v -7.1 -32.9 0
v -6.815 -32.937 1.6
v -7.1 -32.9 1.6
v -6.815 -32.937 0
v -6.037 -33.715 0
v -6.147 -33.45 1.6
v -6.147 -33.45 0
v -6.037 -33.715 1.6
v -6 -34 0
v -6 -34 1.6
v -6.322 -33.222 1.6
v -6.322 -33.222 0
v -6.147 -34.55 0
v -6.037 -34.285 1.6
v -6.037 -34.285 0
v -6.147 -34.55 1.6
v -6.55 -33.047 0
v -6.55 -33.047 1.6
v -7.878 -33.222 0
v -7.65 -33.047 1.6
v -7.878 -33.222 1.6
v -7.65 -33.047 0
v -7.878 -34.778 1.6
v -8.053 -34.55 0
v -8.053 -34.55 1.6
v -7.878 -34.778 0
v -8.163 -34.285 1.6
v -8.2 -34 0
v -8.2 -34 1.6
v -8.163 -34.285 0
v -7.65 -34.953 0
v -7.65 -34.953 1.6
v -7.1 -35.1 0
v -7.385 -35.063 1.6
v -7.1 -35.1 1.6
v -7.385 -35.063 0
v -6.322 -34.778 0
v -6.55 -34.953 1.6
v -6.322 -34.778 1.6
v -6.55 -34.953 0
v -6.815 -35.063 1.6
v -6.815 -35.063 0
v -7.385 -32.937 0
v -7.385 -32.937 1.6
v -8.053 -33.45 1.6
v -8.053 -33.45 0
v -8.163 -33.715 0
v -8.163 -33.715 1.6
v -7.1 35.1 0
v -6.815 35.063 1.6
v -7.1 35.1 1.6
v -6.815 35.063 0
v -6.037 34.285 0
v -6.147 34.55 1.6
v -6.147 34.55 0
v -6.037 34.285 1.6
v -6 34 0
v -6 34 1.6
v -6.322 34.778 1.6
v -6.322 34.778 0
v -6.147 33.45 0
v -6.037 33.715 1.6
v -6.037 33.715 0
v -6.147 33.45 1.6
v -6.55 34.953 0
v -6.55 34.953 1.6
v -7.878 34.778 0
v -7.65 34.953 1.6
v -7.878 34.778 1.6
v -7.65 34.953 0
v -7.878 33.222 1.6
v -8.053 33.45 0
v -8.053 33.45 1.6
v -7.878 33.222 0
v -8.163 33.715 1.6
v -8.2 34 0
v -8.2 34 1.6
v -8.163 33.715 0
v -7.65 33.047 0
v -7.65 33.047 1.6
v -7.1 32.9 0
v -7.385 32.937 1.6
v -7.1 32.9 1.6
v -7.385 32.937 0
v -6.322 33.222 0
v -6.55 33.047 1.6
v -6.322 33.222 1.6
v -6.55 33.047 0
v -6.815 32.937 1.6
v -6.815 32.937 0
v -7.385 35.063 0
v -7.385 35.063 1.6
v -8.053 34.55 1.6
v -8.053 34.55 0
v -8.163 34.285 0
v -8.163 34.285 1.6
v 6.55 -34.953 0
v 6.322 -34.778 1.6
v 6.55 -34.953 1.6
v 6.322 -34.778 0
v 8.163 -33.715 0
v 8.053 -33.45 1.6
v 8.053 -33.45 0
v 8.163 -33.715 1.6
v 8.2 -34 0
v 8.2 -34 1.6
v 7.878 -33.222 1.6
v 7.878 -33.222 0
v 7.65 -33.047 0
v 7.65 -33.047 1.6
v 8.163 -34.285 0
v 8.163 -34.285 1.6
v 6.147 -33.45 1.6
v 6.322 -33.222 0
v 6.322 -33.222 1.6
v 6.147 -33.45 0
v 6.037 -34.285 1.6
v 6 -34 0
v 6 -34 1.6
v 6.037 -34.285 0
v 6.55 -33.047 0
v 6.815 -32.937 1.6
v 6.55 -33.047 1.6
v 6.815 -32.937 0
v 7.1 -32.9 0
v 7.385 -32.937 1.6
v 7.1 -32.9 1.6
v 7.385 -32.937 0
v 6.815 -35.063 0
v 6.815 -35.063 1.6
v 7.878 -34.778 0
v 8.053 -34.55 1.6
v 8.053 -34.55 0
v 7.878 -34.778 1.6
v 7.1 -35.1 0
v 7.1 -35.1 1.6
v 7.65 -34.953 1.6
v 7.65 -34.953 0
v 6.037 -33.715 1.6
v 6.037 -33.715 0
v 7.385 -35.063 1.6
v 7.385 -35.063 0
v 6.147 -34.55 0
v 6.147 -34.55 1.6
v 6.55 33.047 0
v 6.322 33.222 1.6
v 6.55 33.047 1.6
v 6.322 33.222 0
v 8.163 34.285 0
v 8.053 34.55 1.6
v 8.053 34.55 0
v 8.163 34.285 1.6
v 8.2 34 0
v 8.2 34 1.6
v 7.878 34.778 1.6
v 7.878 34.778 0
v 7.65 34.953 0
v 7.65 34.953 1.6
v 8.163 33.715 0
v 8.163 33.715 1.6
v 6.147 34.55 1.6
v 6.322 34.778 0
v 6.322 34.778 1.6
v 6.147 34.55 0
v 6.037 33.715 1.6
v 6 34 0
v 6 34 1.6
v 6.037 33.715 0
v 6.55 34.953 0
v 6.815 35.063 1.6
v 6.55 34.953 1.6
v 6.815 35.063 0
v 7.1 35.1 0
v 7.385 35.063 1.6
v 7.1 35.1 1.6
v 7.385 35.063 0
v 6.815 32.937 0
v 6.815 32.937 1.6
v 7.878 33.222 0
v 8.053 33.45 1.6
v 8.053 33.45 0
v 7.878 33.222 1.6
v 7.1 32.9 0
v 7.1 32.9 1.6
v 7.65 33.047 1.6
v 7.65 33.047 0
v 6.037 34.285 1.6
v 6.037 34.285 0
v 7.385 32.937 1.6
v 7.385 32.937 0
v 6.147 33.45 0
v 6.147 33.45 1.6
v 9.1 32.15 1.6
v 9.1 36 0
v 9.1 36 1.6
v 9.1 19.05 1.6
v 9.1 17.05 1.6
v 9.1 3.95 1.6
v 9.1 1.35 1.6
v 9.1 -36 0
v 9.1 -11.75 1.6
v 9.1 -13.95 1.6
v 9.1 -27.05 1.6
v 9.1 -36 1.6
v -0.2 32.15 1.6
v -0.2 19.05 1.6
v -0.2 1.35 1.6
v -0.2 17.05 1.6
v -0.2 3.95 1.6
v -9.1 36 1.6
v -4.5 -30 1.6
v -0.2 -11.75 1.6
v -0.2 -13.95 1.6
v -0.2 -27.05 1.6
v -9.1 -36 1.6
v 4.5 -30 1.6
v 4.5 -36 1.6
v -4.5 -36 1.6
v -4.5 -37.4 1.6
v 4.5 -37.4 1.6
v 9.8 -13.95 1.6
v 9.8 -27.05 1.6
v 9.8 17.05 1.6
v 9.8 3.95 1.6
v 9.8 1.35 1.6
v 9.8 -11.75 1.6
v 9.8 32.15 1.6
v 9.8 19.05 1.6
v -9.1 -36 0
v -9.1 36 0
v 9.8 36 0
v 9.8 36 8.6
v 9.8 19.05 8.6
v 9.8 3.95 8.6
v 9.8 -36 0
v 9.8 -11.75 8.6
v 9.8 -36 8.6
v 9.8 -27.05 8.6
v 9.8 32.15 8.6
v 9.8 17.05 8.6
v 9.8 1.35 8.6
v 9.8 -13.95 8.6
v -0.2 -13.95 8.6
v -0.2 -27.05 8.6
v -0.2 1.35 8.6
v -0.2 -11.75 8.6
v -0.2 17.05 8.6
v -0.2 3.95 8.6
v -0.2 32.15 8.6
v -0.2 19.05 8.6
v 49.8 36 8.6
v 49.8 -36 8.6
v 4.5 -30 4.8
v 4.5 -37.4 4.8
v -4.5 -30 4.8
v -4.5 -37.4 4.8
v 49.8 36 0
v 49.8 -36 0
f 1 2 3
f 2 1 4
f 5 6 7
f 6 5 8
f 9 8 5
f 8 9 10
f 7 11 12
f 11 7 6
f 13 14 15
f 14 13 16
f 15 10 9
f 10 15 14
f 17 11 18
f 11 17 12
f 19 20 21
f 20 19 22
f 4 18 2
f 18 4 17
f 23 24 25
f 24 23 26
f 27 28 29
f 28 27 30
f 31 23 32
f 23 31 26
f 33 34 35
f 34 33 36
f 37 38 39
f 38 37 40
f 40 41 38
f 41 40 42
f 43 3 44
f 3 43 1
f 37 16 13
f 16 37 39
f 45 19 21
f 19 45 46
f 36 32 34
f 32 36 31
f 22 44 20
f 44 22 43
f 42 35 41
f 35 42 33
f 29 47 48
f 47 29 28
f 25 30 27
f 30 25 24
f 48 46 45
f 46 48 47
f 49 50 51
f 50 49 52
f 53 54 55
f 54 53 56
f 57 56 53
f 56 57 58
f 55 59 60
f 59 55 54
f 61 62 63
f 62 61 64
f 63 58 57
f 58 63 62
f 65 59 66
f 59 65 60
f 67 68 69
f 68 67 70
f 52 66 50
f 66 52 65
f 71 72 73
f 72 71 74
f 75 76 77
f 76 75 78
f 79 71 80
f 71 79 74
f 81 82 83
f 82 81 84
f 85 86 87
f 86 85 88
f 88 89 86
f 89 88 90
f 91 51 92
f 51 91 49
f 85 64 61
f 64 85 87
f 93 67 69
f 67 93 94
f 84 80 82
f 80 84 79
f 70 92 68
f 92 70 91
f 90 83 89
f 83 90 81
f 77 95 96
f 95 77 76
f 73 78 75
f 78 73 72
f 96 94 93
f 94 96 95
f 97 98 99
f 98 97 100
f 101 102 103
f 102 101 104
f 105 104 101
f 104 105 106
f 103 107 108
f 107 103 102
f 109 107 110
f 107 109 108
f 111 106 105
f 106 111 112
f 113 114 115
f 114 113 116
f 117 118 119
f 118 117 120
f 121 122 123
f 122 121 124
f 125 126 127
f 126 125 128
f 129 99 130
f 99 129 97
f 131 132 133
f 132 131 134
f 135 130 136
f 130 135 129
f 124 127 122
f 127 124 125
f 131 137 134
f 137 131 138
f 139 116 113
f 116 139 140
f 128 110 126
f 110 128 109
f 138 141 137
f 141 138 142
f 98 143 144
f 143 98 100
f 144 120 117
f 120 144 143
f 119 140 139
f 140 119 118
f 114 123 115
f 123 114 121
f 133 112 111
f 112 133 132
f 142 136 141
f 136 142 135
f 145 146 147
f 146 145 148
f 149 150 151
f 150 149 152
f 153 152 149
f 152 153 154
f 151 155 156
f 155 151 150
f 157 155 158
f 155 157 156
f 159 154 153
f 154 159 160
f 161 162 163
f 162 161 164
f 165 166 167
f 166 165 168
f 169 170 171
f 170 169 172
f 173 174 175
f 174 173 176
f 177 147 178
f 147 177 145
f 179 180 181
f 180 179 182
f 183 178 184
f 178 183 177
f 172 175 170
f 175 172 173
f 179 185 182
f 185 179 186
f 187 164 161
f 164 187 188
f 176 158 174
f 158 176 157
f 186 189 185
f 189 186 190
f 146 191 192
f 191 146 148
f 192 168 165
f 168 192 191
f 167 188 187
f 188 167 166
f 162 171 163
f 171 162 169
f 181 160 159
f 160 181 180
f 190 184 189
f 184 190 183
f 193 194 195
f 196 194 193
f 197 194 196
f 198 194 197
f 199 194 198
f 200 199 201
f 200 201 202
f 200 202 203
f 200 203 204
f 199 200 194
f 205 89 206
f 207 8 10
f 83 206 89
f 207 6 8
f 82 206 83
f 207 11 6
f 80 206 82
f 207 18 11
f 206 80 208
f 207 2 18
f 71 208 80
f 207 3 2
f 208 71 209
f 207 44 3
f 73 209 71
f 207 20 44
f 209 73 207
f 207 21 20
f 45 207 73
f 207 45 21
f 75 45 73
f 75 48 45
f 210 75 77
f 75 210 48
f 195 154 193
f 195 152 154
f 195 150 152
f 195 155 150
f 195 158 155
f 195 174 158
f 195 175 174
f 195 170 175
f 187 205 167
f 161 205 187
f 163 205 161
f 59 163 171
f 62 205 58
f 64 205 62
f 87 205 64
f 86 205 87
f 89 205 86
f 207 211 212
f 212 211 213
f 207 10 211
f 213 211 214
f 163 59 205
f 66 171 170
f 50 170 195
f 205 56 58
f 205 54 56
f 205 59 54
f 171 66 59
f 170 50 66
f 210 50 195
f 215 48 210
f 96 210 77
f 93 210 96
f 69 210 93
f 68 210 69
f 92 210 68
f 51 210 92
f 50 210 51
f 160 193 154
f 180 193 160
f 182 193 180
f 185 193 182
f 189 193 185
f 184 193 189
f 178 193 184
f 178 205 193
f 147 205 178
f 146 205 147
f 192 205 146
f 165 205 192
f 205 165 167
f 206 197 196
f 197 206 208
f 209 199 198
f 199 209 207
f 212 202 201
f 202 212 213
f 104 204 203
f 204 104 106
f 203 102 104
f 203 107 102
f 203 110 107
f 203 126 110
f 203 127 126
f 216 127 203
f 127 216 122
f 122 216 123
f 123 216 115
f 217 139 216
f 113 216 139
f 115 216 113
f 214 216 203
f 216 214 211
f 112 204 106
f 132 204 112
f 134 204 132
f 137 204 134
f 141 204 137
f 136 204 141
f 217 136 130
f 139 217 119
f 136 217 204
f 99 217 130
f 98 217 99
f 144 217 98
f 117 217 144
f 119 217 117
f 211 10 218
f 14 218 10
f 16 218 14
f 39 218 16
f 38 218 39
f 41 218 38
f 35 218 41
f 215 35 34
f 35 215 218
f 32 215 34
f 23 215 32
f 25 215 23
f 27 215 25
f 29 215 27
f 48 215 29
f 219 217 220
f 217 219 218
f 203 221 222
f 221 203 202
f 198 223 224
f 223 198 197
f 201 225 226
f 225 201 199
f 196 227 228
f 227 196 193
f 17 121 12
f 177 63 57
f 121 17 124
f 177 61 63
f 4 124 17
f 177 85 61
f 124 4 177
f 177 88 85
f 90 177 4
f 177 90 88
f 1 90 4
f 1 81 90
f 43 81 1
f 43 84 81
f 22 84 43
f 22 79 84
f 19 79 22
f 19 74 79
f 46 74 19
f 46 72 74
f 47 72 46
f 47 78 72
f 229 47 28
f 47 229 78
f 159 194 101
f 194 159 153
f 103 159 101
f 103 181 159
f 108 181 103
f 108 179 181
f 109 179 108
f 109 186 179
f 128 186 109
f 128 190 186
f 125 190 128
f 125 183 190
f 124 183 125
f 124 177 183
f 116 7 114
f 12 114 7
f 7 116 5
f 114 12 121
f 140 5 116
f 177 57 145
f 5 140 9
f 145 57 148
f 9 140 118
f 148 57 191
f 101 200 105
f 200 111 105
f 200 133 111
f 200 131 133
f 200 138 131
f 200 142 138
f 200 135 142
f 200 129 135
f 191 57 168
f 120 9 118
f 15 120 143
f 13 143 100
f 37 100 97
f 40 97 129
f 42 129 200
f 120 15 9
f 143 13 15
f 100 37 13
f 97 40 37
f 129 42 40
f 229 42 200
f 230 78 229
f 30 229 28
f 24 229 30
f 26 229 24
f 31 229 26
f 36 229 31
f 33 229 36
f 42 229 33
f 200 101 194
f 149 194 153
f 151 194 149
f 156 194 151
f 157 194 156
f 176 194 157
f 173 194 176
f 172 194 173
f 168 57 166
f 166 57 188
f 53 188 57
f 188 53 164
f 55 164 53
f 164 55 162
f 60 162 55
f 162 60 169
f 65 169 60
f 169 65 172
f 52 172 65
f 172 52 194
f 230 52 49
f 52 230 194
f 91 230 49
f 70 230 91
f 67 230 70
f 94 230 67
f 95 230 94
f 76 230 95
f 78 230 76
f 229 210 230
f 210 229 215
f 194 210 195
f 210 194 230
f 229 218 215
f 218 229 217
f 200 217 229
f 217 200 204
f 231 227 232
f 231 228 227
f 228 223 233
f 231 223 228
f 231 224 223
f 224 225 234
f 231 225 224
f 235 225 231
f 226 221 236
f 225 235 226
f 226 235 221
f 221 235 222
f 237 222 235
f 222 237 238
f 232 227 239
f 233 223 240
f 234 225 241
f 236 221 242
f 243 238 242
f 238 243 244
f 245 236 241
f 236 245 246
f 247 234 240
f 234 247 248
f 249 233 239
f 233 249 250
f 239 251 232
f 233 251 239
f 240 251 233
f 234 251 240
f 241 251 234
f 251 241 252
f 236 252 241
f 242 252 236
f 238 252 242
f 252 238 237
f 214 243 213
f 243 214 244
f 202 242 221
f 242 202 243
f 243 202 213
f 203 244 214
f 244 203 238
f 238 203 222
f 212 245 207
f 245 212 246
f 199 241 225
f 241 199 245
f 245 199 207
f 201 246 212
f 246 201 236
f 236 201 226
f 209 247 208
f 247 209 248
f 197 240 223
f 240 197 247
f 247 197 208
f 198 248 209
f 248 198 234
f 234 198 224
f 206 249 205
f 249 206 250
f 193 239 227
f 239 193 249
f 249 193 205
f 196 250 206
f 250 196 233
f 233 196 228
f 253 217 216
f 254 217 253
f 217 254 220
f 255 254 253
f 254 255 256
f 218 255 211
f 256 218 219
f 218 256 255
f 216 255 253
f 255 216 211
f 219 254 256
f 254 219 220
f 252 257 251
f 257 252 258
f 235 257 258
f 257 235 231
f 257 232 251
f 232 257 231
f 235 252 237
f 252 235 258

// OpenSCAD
//
// ============================================================================
// SteamMachine UM790
// Project Phoenix
//
// Archivo  : hub_usb.scad
// Versión  : 2.0
// Fecha    : 2026-10-05
//
// Volumen mecánico de referencia del Hub USB para el ensamblaje
// virtual v1.
//
// v2.0 (2026-10-05): SUSTITUYE al CJMCU-204 (44,1 x 44,1 x 12 mm).
// Hub nuevo de placa alargada (72 x 18,2 mm): 4 bocas USB-A
// horizontales en un lado largo (+X local) y entrada USB-C en un
// extremo (-Y local). Medidas tomadas de fotos — ver usb_hub_* en
// 00_parametros.scad.
//
// NO ES UNA PIEZA IMPRIMIBLE.
//
// Sistema de coordenadas LOCAL de este módulo:
//   Origen (0,0,0) = centro de la placa en X/Y, cara inferior
//                     (la que mira a la pared).
//   +Z = hacia los componentes.
//   +X = lado de las bocas USB-A (queda hacia ARRIBA en el chasis).
//   -Y = extremo del USB-C (puede montarse girada 180°: los
//        taladros son simétricos).
//
// ============================================================================

include <../../../00_parametros.scad>;

$fn = 24;

part_version = "2.0";


//=============================================================================
// COLORES
//=============================================================================

hubBodyColor  = [0.20,0.20,0.20,1.0];
hubPortColor  = [0.80,0.80,0.80,1.0];
hubCableColor = [1.00,0.65,0.00,0.15];


//=============================================================================
// PLACA DEL HUB
//=============================================================================

module hubUsbBody()
{

    color(hubBodyColor)

    difference()
    {

        translate([
            -usb_hub_width/2,
            -usb_hub_depth/2,
            0
        ])

            cube([
                usb_hub_width,
                usb_hub_depth,
                usb_hub_pcb_thickness
            ]);

        hubUsbMountHoles();

    }

}


//=============================================================================
// TALADROS DE FIJACIÓN (4x M2, simétricos)
//=============================================================================

module hubUsbMountHoles()
{

    for(ix=[-1,1])
    for(iy=[-1,1])

        translate([ix*usb_hub_hole_spacing_x/2, iy*usb_hub_hole_spacing_y/2, -0.5])

            cylinder(
                d = usb_hub_board_hole,
                h = usb_hub_pcb_thickness+1
            );

}


//=============================================================================
// CONECTORES (4x USB-A en el lado +X, USB-C en el extremo -Y)
//
// Posiciones a lo largo (Y) medidas en las fotos y reescaladas
// (x1,051) con la medida real entre taladros (68 mm): centros de las
// bocas a -20,5 / -5,2 / +10,5 / +25,6 mm del centro de la placa
// (paso ~15,4 mm). Carcasa USB-A ~13,1 x 10 x 7 mm, asomando 0,7 mm
// por el borde +X. USB-C ~9 x 7,4 x 3,2 mm, asomando 1,4 mm por -Y.
//=============================================================================

hub_port_y        = [-20.5, -5.2, 10.5, 25.6];
hub_port_width    = 13.1;
hub_port_length   = 10.0;
hub_port_overhang = 0.7;
hub_port_height   = usb_hub_height - usb_hub_pcb_thickness;

module hubUsbPorts()
{

    color(hubPortColor)
    {

        for(y = hub_port_y)

            translate([
                usb_hub_width/2 + hub_port_overhang - hub_port_length,
                y - hub_port_width/2,
                usb_hub_pcb_thickness
            ])

                cube([hub_port_length, hub_port_width, hub_port_height]);

        translate([-4.5, -usb_hub_depth/2 - 1.4, usb_hub_pcb_thickness])
            cube([9.0, 7.4, 3.2]);

    }

}


//=============================================================================
// CUERPO MECÁNICO (para comprobación de colisiones "duras")
//=============================================================================

module hubUsbBodyFull()
{

    union()
    {
        hubUsbBody();
        hubUsbPorts();
    }

}


//=============================================================================
// VOLUMEN DE SEGURIDAD DE CABLEADO
//
// Espacio reservado por ENCIMA de las bocas USB-A (+X local = arriba
// en el chasis) para las clavijas y el arranque de sus cables
// (clavija USB-A típica ~35-40 mm con el alivio de tensión).
//=============================================================================

module hubUsbCableKeepout(length = 40)
{

    color(hubCableColor)

    translate([
        usb_hub_width/2 + hub_port_overhang,
        -usb_hub_depth/2,
        0
    ])

        cube([
            length,
            usb_hub_depth,
            usb_hub_height
        ]);

}


//=============================================================================
// CONJUNTO COMPLETO (visualización)
//=============================================================================

module hubUsb()
{

    hubUsbBodyFull();

    hubUsbCableKeepout();

}


//=============================================================================
// PREVIEW
//=============================================================================

hubUsb();
